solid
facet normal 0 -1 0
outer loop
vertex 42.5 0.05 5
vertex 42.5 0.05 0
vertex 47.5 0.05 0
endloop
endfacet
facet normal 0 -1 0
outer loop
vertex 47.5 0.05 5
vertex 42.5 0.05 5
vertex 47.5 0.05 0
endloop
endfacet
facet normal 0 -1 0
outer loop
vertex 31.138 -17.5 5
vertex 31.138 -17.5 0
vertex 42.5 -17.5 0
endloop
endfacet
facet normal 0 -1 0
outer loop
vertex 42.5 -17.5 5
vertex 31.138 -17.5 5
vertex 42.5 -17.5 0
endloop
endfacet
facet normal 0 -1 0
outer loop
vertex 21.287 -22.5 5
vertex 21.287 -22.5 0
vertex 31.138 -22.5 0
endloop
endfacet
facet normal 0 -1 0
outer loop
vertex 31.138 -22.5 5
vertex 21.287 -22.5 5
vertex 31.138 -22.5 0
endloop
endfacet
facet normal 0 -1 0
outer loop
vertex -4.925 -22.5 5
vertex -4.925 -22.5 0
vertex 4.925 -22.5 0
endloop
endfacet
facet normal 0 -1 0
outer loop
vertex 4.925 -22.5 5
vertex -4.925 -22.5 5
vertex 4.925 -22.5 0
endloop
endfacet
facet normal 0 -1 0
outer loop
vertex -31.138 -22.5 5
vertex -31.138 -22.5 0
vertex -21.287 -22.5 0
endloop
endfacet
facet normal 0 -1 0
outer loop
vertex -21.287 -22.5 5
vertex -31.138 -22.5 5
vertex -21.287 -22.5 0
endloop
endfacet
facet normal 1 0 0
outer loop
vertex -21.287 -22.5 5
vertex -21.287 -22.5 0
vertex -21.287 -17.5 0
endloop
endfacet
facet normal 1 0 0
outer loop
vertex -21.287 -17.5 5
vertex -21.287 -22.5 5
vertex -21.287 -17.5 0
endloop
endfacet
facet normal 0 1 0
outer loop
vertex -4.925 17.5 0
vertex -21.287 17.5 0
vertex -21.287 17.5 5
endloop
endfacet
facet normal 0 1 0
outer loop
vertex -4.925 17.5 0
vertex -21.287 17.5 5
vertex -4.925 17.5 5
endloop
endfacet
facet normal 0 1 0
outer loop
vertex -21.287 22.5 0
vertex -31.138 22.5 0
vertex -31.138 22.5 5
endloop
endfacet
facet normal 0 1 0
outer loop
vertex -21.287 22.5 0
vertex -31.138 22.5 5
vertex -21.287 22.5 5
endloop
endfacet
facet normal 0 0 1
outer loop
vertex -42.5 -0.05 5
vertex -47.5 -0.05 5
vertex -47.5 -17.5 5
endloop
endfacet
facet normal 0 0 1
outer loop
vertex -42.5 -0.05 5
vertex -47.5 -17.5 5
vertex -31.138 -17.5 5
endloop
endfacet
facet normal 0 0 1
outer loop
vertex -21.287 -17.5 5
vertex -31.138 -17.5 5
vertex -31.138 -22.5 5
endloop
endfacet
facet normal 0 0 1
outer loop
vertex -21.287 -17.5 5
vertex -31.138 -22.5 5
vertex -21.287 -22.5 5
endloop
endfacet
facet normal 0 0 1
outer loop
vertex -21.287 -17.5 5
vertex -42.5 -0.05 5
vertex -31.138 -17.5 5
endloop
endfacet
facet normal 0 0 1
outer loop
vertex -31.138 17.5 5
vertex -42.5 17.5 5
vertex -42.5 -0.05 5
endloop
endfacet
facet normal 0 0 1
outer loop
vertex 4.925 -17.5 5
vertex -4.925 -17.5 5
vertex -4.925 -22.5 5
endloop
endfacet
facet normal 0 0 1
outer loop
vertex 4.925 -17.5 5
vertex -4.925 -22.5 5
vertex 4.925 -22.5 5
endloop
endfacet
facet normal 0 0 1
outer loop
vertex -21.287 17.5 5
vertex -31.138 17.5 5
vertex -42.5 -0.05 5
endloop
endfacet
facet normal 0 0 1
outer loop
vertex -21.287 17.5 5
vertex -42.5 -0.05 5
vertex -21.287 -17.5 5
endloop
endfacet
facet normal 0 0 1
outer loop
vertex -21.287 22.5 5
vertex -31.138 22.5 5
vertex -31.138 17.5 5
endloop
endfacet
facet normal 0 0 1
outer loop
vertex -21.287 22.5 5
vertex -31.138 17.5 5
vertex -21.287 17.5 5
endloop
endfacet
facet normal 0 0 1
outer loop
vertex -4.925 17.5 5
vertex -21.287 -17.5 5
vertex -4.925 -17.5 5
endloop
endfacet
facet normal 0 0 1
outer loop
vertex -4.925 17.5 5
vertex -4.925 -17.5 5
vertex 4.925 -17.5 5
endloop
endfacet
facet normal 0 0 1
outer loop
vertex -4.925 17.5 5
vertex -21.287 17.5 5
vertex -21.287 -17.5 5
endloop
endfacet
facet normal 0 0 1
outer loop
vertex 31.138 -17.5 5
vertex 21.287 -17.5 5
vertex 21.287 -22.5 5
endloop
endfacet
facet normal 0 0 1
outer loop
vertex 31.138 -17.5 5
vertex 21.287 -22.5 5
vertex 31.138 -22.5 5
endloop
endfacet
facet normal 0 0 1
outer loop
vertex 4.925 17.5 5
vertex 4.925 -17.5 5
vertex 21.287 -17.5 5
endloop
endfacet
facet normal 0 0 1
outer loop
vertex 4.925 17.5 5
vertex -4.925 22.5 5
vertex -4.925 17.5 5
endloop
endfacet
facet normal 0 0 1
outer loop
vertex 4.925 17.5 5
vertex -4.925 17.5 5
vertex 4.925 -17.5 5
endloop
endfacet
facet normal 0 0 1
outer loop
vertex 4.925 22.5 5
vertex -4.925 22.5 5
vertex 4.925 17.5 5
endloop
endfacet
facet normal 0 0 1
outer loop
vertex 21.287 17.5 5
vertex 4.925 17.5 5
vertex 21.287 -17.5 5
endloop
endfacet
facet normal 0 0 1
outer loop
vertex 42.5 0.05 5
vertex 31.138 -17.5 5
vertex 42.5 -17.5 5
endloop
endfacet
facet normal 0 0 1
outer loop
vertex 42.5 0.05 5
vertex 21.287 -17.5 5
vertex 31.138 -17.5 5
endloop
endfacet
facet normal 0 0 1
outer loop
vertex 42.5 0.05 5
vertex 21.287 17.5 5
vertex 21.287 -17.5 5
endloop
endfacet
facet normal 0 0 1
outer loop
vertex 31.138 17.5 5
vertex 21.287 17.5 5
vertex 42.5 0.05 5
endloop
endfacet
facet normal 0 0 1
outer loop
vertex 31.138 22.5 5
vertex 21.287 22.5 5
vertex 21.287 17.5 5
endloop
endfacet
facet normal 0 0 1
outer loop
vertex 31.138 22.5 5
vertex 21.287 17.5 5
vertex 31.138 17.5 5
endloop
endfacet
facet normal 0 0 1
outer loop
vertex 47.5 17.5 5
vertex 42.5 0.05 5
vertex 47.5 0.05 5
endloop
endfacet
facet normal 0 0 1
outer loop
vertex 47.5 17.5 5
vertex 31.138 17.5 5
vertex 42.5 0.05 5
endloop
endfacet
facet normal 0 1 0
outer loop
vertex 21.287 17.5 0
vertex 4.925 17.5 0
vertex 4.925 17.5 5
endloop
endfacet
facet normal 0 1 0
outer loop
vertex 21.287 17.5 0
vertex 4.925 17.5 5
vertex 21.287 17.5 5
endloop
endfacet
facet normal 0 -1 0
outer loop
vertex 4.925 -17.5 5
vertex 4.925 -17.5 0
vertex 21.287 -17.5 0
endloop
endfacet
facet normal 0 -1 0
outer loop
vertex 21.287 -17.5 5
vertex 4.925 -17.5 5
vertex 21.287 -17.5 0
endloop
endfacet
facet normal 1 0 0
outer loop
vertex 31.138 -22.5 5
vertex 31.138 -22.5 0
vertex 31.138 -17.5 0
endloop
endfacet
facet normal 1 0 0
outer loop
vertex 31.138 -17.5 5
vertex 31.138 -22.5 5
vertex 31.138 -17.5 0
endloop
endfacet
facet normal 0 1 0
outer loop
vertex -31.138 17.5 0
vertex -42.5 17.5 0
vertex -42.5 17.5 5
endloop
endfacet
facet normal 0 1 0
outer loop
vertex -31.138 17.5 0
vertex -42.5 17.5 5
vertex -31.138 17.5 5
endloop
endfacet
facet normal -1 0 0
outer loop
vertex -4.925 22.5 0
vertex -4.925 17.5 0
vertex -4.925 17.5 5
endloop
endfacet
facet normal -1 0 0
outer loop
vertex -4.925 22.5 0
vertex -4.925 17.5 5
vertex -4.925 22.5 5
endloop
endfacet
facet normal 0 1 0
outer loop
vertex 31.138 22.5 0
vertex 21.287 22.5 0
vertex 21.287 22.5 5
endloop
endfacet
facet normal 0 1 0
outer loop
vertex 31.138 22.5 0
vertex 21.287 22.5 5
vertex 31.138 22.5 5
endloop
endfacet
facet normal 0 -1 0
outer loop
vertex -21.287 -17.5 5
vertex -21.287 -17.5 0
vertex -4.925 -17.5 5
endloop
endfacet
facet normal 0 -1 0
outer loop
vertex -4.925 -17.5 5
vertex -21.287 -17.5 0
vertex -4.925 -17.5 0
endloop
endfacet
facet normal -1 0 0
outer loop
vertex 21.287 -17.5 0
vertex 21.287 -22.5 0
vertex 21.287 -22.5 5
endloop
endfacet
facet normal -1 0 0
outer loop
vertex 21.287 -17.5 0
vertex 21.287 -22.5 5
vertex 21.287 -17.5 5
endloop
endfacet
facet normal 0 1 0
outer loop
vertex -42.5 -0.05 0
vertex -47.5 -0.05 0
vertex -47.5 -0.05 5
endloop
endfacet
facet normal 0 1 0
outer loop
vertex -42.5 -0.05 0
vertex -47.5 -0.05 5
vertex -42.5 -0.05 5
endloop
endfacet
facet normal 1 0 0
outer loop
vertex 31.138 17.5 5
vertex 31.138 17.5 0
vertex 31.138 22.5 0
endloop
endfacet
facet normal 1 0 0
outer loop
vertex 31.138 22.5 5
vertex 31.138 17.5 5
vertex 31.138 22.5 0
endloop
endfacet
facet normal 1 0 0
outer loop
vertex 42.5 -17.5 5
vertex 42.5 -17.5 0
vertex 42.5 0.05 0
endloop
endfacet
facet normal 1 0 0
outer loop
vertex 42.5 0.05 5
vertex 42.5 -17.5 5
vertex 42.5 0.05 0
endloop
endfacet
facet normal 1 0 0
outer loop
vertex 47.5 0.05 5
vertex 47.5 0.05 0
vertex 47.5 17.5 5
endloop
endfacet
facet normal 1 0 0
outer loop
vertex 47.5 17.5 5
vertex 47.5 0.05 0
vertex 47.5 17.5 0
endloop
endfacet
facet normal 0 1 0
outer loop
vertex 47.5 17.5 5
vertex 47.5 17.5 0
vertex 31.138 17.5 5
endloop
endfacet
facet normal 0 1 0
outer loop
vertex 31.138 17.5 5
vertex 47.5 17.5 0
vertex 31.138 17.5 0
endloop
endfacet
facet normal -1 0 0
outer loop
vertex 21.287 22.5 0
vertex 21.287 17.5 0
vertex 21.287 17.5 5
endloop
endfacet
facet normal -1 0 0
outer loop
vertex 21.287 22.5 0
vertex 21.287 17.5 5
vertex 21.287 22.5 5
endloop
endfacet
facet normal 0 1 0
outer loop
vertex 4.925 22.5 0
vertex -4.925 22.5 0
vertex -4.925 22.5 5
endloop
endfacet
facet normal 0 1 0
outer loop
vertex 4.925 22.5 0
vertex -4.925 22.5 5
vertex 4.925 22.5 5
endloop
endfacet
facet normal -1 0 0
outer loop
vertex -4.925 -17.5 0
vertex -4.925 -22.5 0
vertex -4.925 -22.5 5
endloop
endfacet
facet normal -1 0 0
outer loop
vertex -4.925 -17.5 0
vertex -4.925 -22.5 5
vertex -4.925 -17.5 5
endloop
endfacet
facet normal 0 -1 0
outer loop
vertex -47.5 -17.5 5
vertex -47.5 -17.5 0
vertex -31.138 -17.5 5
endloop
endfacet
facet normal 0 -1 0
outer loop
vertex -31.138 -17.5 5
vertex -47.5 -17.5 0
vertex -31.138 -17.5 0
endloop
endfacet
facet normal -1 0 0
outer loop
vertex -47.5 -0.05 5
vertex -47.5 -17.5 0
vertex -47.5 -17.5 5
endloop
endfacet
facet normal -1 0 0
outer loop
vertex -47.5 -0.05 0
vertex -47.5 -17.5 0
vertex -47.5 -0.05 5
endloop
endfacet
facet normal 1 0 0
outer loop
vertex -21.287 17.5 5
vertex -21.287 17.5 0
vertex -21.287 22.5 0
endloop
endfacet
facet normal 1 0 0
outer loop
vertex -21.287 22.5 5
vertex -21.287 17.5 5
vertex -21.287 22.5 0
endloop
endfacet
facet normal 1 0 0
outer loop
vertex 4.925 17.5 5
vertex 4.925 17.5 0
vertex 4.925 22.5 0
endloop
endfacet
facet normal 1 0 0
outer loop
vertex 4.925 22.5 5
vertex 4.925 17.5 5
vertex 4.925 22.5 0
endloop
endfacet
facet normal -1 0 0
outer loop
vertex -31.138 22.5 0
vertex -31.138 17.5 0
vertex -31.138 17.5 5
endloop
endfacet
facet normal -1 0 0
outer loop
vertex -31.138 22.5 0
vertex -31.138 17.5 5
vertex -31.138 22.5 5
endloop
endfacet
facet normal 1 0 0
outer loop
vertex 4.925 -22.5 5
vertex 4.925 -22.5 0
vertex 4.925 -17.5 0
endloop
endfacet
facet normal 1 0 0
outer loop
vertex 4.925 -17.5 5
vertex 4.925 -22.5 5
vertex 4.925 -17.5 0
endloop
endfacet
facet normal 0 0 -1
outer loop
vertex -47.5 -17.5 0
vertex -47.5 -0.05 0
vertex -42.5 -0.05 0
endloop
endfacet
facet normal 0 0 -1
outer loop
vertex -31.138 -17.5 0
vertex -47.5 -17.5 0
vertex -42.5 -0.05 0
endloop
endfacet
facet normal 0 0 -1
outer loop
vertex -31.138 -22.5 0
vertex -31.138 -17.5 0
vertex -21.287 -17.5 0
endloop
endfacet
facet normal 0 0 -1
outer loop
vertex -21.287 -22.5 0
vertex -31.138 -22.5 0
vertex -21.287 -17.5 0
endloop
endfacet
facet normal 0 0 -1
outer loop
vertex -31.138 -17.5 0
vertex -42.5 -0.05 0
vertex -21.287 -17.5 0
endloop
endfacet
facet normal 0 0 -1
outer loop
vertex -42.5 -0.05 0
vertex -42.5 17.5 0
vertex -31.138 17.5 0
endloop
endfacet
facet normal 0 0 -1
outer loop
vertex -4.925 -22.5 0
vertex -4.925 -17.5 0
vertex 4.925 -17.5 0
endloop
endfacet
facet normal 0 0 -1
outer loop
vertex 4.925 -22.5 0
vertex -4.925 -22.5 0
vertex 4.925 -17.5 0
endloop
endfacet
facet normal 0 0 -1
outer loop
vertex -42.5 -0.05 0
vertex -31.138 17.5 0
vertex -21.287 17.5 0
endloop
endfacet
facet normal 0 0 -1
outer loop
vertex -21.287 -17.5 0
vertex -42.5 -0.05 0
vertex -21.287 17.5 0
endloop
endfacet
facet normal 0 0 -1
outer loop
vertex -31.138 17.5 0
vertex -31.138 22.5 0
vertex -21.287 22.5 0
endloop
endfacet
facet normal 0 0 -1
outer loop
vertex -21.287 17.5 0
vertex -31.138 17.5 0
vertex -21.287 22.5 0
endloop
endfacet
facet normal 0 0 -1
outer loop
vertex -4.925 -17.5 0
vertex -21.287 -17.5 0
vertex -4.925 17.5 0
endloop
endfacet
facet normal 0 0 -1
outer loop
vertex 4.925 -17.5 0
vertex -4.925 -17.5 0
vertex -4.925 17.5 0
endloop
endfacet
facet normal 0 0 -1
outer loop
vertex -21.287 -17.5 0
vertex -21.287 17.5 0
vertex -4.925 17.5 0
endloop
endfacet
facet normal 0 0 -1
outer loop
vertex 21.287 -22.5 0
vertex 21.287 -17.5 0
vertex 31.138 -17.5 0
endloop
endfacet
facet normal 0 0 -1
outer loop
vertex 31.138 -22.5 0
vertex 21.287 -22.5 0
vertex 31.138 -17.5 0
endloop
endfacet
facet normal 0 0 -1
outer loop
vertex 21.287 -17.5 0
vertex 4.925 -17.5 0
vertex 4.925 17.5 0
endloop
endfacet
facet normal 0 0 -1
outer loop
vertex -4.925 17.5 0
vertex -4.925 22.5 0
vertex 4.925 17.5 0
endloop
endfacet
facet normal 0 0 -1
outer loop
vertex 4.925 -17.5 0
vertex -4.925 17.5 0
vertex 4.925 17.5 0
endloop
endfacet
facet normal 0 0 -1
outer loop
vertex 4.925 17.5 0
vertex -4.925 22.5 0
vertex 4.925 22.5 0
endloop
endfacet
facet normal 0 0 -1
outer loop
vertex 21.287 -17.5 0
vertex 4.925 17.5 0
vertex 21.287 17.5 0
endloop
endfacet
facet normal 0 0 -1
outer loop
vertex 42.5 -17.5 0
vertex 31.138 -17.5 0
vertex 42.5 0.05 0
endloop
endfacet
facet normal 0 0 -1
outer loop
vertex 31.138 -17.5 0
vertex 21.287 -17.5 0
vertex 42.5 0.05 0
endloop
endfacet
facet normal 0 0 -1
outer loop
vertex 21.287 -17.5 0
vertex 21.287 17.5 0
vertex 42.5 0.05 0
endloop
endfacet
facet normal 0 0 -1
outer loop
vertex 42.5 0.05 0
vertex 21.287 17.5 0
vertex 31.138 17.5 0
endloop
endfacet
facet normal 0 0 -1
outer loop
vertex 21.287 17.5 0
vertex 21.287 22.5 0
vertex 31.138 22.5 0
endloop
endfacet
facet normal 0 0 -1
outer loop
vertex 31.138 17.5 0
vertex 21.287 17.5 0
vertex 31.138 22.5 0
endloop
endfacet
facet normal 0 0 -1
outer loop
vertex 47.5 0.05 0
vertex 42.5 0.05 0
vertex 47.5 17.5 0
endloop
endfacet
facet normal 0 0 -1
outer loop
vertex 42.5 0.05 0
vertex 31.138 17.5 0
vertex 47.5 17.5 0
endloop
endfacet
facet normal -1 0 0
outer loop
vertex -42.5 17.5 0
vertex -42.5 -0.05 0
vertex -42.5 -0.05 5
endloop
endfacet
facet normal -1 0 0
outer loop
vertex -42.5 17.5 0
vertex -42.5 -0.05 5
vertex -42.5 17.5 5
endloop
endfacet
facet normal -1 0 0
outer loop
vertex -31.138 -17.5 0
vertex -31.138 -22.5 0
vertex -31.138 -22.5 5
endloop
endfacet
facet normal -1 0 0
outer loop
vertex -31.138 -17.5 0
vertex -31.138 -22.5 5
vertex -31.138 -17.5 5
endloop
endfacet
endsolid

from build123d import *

# Parameters (mm, degrees)
SKETCH2_W           = 85
SKETCH2_H           = 35
SKETCH2_W_2         = 5
SKETCH2_H_2         = 17.45
SKETCH2_W_3         = 9.85
SKETCH2_H_3         = 5
BOSS_EXTRUDE1_DEPTH = 5


with BuildPart() as part:
    # Sketch2 → Boss-Extrude1 (new body)
    with BuildSketch(Plane.XY):
        Rectangle(SKETCH2_W, SKETCH2_H)
        with Locations((-45, -8.775)):
            Rectangle(SKETCH2_W_2, SKETCH2_H_2)
        with Locations((-26.2125, 20)):
            Rectangle(SKETCH2_W_3, SKETCH2_H_3)
        with Locations((0, 20)):
            Rectangle(SKETCH2_W_3, SKETCH2_H_3)
        with Locations((26.2125, 20)):
            Rectangle(SKETCH2_W_3, SKETCH2_H_3)
        with Locations((45, 8.775)):
            Rectangle(SKETCH2_W_2, SKETCH2_H_2)
        with Locations((26.2125, -20)):
            Rectangle(SKETCH2_W_3, SKETCH2_H_3)
        with Locations((0, -20)):
            Rectangle(SKETCH2_W_3, SKETCH2_H_3)
        with Locations((-26.2125, -20)):
            Rectangle(SKETCH2_W_3, SKETCH2_H_3)
    extrude(amount=BOSS_EXTRUDE1_DEPTH)


solid = part.part
